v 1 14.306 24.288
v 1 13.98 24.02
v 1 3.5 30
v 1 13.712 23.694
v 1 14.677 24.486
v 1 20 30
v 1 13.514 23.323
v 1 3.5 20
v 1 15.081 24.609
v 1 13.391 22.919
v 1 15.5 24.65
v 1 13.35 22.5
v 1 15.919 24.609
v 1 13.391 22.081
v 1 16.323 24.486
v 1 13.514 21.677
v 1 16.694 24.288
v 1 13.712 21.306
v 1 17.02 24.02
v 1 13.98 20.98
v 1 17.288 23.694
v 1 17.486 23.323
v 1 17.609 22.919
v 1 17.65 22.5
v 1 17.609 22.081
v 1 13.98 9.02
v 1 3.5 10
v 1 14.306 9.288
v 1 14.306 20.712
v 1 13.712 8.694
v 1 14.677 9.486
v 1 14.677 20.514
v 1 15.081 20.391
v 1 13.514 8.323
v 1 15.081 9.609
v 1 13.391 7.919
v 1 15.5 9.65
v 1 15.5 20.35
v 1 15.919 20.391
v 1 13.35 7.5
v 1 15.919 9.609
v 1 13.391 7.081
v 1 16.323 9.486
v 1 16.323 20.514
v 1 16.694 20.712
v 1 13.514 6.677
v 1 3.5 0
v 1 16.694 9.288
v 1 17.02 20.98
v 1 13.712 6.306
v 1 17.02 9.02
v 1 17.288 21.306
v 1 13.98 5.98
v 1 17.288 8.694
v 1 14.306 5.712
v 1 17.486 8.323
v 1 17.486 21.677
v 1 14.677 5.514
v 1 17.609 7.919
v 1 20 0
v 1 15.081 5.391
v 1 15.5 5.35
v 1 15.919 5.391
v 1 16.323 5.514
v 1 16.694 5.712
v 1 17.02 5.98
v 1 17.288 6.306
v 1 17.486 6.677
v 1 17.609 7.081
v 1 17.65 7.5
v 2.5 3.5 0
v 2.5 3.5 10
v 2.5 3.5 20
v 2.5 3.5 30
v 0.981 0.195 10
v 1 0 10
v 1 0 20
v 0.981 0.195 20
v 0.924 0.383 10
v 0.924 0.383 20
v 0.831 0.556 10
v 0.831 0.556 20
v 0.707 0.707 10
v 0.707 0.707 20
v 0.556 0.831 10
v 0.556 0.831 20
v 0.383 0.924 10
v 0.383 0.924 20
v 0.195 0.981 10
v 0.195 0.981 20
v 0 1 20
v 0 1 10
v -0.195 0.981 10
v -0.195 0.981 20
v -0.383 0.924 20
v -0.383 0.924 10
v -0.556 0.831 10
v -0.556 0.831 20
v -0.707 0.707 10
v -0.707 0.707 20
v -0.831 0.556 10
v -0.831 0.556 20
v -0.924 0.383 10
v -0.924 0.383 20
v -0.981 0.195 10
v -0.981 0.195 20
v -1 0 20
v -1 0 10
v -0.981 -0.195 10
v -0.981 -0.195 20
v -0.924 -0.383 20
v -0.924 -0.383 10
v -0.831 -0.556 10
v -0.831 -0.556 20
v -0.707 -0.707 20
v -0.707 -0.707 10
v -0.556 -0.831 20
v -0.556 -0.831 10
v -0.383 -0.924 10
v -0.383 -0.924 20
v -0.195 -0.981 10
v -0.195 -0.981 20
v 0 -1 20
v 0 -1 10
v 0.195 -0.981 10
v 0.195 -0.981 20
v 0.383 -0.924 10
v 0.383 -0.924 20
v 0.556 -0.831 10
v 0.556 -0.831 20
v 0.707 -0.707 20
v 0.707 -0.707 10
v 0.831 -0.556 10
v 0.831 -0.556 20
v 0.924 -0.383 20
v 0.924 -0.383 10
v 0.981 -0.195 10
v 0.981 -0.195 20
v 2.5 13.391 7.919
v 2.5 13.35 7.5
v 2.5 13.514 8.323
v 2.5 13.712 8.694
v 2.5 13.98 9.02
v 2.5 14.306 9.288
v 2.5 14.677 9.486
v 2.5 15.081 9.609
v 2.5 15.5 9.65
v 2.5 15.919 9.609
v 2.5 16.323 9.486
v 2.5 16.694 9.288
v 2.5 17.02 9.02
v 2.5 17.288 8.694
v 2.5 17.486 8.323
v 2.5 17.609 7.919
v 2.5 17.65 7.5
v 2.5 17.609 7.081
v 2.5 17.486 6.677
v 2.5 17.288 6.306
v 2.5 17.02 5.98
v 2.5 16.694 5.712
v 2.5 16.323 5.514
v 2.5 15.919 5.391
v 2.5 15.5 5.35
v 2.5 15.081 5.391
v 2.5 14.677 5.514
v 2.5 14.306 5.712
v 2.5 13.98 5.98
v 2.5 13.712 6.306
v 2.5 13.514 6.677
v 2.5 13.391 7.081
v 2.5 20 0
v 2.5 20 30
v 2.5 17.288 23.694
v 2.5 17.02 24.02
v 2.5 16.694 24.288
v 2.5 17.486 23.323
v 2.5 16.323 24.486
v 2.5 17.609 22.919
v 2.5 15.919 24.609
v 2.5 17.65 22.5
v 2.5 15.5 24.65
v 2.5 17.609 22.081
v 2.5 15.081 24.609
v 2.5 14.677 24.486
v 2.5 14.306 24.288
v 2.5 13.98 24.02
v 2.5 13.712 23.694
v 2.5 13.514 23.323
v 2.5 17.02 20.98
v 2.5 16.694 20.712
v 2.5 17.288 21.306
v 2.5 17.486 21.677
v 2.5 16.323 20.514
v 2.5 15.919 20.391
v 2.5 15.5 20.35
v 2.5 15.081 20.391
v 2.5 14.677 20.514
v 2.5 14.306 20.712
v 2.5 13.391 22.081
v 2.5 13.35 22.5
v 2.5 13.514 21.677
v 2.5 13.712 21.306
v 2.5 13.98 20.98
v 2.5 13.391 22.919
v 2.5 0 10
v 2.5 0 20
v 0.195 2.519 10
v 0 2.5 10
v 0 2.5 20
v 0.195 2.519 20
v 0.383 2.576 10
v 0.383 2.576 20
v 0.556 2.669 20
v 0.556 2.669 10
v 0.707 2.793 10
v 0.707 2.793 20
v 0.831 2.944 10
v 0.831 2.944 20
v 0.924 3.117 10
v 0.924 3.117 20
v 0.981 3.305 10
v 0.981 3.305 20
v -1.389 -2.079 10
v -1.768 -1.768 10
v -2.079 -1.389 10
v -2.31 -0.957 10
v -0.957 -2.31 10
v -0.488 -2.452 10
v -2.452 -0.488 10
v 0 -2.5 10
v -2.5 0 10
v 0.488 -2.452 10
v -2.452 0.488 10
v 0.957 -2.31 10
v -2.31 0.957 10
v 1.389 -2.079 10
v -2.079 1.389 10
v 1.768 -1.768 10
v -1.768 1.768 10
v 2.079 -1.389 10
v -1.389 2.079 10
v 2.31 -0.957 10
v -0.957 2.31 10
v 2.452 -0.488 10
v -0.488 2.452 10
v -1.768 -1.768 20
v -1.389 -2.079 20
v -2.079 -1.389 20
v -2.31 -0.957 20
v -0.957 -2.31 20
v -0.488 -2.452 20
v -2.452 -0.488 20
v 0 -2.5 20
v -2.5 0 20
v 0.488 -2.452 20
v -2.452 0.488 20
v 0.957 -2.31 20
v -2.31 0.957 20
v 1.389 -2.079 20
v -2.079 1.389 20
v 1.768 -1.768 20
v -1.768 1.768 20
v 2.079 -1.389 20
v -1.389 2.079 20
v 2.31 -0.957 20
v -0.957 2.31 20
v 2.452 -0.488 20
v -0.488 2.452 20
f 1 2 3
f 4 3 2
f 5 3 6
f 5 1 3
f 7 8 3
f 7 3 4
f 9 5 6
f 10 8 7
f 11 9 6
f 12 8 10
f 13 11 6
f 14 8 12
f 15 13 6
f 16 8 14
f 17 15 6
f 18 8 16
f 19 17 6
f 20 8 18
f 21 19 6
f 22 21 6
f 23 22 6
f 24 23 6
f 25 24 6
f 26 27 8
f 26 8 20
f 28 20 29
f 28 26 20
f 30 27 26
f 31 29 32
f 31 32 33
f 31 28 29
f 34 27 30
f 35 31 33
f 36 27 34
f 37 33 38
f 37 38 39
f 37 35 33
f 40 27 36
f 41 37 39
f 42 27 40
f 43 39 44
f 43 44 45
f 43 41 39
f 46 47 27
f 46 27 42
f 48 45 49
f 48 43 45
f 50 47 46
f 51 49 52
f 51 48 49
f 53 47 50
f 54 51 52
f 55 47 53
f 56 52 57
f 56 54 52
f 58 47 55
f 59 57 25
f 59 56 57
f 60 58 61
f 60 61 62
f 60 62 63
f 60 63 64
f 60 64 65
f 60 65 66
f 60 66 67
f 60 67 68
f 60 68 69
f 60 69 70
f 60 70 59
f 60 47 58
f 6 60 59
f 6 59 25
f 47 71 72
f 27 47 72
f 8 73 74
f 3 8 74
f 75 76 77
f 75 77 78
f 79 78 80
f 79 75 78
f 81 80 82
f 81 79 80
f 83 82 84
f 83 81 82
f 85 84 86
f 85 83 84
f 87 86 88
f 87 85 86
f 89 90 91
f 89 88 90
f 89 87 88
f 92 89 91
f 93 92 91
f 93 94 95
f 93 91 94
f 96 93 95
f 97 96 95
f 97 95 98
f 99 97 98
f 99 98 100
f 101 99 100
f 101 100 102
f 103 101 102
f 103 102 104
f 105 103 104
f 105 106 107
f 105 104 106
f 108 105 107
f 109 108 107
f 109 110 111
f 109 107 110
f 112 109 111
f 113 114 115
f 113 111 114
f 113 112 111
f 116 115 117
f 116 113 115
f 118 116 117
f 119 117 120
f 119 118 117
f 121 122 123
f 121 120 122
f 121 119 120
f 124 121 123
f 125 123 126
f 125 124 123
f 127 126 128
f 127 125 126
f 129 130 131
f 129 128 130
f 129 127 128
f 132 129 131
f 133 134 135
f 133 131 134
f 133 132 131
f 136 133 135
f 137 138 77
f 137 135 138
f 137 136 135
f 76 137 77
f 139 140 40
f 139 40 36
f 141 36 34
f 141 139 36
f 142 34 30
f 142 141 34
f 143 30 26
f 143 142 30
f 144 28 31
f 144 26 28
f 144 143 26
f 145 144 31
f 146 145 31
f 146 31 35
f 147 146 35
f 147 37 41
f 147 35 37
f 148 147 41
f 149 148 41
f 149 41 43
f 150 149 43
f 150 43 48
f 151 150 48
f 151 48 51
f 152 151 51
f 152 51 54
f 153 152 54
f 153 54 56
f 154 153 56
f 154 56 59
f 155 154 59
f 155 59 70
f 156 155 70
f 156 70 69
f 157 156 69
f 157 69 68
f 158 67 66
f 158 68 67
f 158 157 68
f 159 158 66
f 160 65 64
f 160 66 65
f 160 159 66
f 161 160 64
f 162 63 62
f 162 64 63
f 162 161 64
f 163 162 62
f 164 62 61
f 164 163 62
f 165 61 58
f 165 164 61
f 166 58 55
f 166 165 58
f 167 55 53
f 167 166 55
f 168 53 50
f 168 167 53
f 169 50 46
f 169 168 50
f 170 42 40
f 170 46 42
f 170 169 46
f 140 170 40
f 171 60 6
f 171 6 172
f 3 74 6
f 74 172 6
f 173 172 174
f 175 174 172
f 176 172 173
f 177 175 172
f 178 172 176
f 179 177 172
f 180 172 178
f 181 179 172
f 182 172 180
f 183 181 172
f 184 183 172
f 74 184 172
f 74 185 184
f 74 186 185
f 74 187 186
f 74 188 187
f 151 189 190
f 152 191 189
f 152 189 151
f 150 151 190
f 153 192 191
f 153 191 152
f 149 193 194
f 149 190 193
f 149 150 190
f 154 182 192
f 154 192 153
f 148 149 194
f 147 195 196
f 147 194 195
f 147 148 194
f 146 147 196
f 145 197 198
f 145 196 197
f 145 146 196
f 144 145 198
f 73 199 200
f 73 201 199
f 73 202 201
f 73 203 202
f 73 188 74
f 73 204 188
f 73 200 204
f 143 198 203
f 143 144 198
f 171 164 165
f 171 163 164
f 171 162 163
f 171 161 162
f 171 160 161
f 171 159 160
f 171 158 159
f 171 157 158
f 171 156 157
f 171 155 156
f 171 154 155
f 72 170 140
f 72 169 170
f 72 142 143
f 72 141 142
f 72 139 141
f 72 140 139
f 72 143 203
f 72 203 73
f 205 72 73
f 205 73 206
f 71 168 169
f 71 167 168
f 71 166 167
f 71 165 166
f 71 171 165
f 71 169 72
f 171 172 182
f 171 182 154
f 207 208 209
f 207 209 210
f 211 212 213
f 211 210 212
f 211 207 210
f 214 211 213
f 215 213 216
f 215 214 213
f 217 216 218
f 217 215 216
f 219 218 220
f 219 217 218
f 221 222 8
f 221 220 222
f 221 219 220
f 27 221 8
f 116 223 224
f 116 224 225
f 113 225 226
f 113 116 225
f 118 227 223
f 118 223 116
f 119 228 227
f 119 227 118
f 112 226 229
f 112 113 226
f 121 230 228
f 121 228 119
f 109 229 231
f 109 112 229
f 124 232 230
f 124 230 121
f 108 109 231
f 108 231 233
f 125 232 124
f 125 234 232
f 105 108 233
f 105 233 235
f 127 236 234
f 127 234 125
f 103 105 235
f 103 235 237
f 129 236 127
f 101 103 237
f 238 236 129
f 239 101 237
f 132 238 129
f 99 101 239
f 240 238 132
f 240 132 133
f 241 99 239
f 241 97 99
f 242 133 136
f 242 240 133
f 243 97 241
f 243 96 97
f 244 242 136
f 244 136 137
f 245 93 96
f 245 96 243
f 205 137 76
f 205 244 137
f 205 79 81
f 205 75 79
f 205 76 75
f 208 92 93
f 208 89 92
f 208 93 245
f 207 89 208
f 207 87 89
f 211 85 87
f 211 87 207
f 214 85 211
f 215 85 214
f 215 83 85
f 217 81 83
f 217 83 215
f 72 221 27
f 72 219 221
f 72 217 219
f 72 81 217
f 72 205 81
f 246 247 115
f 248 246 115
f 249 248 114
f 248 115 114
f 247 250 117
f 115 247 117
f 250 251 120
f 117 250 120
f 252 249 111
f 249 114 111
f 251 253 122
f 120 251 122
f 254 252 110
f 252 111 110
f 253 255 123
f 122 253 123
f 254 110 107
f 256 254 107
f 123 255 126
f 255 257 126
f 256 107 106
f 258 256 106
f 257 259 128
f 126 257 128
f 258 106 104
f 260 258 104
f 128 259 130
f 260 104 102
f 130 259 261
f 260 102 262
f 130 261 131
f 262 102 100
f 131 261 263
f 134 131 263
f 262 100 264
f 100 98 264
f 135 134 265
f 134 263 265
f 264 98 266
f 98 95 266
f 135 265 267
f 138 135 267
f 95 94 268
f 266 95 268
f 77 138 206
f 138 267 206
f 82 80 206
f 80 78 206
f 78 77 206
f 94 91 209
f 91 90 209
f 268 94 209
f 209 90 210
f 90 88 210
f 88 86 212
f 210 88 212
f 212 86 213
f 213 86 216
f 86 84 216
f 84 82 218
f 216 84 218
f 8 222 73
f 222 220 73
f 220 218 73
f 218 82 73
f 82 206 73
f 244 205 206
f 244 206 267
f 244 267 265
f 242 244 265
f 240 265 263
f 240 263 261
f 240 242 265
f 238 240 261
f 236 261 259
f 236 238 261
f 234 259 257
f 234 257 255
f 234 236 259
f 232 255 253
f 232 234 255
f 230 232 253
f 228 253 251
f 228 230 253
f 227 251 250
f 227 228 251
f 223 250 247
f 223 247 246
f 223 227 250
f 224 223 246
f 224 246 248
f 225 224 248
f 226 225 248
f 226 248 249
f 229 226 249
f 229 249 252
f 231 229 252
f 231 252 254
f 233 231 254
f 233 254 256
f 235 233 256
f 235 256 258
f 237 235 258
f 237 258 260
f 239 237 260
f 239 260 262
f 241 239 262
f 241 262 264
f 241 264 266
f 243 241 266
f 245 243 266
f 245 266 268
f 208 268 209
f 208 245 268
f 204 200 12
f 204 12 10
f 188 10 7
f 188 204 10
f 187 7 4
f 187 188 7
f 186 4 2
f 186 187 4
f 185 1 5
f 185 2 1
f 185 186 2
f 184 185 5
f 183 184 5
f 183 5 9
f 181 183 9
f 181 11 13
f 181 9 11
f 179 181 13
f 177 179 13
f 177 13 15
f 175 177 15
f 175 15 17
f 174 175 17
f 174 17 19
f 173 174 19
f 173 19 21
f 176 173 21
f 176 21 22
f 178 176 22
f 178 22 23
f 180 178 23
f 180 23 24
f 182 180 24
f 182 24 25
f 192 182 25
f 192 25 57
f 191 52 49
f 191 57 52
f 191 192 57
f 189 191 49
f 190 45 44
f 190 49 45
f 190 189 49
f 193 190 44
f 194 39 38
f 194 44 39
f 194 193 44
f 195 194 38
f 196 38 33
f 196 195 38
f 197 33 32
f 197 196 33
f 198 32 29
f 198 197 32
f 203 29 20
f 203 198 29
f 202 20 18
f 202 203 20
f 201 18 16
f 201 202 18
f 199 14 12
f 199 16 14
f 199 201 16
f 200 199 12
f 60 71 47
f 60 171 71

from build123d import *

# Parameters (mm, degrees)
SKETCH2_R               = 1
BOSS_EXTRUDE2_DEPTH     = 30
CUT_EXTRUDE1_DEPTH      = 37.224991373
CUT_EXTRUDE1_DEPTH_BACK = 37.224991373
SKETCH3_R               = 2.15
SKETCH3_W               = 10
SKETCH3_H               = 7


with BuildPart() as part:
    # Sketch2 → Boss-Extrude2 (new body)
    with BuildSketch(Plane.XY):
        with BuildLine():
            Line((1, 3.5), (1, 20))
            Line((1, 20), (2.5, 20))
            Line((2.5, 20), (2.5, 0))
            ThreePointArc((2.5, 0), (-1.767766953, -1.767766953), (0, 2.5))
            ThreePointArc((0, 2.5), (0.707106781, 2.792893219), (1, 3.5))
        make_face()
        Circle(SKETCH2_R, mode=Mode.SUBTRACT)
    extrude(amount=BOSS_EXTRUDE2_DEPTH)

    # Sketch3 → Cut-Extrude1 (cut, two sides: drawn at the far end of the back side and taken through both)
    with BuildSketch(Plane.ZY.offset(-1).offset(-CUT_EXTRUDE1_DEPTH_BACK)):
        with Locations(Location((7.5, 15.5, 0), (0, 0, 270))):
            Circle(SKETCH3_R)
        with Locations(Location((22.5, 15.5, 0), (0, 0, 270))):
            Circle(SKETCH3_R)
        with Locations((5, 0)):
            Rectangle(SKETCH3_W, SKETCH3_H)
        with Locations((25, 0)):
            Rectangle(SKETCH3_W, SKETCH3_H)
    extrude(amount=CUT_EXTRUDE1_DEPTH + CUT_EXTRUDE1_DEPTH_BACK, mode=Mode.SUBTRACT)


solid = part.part
